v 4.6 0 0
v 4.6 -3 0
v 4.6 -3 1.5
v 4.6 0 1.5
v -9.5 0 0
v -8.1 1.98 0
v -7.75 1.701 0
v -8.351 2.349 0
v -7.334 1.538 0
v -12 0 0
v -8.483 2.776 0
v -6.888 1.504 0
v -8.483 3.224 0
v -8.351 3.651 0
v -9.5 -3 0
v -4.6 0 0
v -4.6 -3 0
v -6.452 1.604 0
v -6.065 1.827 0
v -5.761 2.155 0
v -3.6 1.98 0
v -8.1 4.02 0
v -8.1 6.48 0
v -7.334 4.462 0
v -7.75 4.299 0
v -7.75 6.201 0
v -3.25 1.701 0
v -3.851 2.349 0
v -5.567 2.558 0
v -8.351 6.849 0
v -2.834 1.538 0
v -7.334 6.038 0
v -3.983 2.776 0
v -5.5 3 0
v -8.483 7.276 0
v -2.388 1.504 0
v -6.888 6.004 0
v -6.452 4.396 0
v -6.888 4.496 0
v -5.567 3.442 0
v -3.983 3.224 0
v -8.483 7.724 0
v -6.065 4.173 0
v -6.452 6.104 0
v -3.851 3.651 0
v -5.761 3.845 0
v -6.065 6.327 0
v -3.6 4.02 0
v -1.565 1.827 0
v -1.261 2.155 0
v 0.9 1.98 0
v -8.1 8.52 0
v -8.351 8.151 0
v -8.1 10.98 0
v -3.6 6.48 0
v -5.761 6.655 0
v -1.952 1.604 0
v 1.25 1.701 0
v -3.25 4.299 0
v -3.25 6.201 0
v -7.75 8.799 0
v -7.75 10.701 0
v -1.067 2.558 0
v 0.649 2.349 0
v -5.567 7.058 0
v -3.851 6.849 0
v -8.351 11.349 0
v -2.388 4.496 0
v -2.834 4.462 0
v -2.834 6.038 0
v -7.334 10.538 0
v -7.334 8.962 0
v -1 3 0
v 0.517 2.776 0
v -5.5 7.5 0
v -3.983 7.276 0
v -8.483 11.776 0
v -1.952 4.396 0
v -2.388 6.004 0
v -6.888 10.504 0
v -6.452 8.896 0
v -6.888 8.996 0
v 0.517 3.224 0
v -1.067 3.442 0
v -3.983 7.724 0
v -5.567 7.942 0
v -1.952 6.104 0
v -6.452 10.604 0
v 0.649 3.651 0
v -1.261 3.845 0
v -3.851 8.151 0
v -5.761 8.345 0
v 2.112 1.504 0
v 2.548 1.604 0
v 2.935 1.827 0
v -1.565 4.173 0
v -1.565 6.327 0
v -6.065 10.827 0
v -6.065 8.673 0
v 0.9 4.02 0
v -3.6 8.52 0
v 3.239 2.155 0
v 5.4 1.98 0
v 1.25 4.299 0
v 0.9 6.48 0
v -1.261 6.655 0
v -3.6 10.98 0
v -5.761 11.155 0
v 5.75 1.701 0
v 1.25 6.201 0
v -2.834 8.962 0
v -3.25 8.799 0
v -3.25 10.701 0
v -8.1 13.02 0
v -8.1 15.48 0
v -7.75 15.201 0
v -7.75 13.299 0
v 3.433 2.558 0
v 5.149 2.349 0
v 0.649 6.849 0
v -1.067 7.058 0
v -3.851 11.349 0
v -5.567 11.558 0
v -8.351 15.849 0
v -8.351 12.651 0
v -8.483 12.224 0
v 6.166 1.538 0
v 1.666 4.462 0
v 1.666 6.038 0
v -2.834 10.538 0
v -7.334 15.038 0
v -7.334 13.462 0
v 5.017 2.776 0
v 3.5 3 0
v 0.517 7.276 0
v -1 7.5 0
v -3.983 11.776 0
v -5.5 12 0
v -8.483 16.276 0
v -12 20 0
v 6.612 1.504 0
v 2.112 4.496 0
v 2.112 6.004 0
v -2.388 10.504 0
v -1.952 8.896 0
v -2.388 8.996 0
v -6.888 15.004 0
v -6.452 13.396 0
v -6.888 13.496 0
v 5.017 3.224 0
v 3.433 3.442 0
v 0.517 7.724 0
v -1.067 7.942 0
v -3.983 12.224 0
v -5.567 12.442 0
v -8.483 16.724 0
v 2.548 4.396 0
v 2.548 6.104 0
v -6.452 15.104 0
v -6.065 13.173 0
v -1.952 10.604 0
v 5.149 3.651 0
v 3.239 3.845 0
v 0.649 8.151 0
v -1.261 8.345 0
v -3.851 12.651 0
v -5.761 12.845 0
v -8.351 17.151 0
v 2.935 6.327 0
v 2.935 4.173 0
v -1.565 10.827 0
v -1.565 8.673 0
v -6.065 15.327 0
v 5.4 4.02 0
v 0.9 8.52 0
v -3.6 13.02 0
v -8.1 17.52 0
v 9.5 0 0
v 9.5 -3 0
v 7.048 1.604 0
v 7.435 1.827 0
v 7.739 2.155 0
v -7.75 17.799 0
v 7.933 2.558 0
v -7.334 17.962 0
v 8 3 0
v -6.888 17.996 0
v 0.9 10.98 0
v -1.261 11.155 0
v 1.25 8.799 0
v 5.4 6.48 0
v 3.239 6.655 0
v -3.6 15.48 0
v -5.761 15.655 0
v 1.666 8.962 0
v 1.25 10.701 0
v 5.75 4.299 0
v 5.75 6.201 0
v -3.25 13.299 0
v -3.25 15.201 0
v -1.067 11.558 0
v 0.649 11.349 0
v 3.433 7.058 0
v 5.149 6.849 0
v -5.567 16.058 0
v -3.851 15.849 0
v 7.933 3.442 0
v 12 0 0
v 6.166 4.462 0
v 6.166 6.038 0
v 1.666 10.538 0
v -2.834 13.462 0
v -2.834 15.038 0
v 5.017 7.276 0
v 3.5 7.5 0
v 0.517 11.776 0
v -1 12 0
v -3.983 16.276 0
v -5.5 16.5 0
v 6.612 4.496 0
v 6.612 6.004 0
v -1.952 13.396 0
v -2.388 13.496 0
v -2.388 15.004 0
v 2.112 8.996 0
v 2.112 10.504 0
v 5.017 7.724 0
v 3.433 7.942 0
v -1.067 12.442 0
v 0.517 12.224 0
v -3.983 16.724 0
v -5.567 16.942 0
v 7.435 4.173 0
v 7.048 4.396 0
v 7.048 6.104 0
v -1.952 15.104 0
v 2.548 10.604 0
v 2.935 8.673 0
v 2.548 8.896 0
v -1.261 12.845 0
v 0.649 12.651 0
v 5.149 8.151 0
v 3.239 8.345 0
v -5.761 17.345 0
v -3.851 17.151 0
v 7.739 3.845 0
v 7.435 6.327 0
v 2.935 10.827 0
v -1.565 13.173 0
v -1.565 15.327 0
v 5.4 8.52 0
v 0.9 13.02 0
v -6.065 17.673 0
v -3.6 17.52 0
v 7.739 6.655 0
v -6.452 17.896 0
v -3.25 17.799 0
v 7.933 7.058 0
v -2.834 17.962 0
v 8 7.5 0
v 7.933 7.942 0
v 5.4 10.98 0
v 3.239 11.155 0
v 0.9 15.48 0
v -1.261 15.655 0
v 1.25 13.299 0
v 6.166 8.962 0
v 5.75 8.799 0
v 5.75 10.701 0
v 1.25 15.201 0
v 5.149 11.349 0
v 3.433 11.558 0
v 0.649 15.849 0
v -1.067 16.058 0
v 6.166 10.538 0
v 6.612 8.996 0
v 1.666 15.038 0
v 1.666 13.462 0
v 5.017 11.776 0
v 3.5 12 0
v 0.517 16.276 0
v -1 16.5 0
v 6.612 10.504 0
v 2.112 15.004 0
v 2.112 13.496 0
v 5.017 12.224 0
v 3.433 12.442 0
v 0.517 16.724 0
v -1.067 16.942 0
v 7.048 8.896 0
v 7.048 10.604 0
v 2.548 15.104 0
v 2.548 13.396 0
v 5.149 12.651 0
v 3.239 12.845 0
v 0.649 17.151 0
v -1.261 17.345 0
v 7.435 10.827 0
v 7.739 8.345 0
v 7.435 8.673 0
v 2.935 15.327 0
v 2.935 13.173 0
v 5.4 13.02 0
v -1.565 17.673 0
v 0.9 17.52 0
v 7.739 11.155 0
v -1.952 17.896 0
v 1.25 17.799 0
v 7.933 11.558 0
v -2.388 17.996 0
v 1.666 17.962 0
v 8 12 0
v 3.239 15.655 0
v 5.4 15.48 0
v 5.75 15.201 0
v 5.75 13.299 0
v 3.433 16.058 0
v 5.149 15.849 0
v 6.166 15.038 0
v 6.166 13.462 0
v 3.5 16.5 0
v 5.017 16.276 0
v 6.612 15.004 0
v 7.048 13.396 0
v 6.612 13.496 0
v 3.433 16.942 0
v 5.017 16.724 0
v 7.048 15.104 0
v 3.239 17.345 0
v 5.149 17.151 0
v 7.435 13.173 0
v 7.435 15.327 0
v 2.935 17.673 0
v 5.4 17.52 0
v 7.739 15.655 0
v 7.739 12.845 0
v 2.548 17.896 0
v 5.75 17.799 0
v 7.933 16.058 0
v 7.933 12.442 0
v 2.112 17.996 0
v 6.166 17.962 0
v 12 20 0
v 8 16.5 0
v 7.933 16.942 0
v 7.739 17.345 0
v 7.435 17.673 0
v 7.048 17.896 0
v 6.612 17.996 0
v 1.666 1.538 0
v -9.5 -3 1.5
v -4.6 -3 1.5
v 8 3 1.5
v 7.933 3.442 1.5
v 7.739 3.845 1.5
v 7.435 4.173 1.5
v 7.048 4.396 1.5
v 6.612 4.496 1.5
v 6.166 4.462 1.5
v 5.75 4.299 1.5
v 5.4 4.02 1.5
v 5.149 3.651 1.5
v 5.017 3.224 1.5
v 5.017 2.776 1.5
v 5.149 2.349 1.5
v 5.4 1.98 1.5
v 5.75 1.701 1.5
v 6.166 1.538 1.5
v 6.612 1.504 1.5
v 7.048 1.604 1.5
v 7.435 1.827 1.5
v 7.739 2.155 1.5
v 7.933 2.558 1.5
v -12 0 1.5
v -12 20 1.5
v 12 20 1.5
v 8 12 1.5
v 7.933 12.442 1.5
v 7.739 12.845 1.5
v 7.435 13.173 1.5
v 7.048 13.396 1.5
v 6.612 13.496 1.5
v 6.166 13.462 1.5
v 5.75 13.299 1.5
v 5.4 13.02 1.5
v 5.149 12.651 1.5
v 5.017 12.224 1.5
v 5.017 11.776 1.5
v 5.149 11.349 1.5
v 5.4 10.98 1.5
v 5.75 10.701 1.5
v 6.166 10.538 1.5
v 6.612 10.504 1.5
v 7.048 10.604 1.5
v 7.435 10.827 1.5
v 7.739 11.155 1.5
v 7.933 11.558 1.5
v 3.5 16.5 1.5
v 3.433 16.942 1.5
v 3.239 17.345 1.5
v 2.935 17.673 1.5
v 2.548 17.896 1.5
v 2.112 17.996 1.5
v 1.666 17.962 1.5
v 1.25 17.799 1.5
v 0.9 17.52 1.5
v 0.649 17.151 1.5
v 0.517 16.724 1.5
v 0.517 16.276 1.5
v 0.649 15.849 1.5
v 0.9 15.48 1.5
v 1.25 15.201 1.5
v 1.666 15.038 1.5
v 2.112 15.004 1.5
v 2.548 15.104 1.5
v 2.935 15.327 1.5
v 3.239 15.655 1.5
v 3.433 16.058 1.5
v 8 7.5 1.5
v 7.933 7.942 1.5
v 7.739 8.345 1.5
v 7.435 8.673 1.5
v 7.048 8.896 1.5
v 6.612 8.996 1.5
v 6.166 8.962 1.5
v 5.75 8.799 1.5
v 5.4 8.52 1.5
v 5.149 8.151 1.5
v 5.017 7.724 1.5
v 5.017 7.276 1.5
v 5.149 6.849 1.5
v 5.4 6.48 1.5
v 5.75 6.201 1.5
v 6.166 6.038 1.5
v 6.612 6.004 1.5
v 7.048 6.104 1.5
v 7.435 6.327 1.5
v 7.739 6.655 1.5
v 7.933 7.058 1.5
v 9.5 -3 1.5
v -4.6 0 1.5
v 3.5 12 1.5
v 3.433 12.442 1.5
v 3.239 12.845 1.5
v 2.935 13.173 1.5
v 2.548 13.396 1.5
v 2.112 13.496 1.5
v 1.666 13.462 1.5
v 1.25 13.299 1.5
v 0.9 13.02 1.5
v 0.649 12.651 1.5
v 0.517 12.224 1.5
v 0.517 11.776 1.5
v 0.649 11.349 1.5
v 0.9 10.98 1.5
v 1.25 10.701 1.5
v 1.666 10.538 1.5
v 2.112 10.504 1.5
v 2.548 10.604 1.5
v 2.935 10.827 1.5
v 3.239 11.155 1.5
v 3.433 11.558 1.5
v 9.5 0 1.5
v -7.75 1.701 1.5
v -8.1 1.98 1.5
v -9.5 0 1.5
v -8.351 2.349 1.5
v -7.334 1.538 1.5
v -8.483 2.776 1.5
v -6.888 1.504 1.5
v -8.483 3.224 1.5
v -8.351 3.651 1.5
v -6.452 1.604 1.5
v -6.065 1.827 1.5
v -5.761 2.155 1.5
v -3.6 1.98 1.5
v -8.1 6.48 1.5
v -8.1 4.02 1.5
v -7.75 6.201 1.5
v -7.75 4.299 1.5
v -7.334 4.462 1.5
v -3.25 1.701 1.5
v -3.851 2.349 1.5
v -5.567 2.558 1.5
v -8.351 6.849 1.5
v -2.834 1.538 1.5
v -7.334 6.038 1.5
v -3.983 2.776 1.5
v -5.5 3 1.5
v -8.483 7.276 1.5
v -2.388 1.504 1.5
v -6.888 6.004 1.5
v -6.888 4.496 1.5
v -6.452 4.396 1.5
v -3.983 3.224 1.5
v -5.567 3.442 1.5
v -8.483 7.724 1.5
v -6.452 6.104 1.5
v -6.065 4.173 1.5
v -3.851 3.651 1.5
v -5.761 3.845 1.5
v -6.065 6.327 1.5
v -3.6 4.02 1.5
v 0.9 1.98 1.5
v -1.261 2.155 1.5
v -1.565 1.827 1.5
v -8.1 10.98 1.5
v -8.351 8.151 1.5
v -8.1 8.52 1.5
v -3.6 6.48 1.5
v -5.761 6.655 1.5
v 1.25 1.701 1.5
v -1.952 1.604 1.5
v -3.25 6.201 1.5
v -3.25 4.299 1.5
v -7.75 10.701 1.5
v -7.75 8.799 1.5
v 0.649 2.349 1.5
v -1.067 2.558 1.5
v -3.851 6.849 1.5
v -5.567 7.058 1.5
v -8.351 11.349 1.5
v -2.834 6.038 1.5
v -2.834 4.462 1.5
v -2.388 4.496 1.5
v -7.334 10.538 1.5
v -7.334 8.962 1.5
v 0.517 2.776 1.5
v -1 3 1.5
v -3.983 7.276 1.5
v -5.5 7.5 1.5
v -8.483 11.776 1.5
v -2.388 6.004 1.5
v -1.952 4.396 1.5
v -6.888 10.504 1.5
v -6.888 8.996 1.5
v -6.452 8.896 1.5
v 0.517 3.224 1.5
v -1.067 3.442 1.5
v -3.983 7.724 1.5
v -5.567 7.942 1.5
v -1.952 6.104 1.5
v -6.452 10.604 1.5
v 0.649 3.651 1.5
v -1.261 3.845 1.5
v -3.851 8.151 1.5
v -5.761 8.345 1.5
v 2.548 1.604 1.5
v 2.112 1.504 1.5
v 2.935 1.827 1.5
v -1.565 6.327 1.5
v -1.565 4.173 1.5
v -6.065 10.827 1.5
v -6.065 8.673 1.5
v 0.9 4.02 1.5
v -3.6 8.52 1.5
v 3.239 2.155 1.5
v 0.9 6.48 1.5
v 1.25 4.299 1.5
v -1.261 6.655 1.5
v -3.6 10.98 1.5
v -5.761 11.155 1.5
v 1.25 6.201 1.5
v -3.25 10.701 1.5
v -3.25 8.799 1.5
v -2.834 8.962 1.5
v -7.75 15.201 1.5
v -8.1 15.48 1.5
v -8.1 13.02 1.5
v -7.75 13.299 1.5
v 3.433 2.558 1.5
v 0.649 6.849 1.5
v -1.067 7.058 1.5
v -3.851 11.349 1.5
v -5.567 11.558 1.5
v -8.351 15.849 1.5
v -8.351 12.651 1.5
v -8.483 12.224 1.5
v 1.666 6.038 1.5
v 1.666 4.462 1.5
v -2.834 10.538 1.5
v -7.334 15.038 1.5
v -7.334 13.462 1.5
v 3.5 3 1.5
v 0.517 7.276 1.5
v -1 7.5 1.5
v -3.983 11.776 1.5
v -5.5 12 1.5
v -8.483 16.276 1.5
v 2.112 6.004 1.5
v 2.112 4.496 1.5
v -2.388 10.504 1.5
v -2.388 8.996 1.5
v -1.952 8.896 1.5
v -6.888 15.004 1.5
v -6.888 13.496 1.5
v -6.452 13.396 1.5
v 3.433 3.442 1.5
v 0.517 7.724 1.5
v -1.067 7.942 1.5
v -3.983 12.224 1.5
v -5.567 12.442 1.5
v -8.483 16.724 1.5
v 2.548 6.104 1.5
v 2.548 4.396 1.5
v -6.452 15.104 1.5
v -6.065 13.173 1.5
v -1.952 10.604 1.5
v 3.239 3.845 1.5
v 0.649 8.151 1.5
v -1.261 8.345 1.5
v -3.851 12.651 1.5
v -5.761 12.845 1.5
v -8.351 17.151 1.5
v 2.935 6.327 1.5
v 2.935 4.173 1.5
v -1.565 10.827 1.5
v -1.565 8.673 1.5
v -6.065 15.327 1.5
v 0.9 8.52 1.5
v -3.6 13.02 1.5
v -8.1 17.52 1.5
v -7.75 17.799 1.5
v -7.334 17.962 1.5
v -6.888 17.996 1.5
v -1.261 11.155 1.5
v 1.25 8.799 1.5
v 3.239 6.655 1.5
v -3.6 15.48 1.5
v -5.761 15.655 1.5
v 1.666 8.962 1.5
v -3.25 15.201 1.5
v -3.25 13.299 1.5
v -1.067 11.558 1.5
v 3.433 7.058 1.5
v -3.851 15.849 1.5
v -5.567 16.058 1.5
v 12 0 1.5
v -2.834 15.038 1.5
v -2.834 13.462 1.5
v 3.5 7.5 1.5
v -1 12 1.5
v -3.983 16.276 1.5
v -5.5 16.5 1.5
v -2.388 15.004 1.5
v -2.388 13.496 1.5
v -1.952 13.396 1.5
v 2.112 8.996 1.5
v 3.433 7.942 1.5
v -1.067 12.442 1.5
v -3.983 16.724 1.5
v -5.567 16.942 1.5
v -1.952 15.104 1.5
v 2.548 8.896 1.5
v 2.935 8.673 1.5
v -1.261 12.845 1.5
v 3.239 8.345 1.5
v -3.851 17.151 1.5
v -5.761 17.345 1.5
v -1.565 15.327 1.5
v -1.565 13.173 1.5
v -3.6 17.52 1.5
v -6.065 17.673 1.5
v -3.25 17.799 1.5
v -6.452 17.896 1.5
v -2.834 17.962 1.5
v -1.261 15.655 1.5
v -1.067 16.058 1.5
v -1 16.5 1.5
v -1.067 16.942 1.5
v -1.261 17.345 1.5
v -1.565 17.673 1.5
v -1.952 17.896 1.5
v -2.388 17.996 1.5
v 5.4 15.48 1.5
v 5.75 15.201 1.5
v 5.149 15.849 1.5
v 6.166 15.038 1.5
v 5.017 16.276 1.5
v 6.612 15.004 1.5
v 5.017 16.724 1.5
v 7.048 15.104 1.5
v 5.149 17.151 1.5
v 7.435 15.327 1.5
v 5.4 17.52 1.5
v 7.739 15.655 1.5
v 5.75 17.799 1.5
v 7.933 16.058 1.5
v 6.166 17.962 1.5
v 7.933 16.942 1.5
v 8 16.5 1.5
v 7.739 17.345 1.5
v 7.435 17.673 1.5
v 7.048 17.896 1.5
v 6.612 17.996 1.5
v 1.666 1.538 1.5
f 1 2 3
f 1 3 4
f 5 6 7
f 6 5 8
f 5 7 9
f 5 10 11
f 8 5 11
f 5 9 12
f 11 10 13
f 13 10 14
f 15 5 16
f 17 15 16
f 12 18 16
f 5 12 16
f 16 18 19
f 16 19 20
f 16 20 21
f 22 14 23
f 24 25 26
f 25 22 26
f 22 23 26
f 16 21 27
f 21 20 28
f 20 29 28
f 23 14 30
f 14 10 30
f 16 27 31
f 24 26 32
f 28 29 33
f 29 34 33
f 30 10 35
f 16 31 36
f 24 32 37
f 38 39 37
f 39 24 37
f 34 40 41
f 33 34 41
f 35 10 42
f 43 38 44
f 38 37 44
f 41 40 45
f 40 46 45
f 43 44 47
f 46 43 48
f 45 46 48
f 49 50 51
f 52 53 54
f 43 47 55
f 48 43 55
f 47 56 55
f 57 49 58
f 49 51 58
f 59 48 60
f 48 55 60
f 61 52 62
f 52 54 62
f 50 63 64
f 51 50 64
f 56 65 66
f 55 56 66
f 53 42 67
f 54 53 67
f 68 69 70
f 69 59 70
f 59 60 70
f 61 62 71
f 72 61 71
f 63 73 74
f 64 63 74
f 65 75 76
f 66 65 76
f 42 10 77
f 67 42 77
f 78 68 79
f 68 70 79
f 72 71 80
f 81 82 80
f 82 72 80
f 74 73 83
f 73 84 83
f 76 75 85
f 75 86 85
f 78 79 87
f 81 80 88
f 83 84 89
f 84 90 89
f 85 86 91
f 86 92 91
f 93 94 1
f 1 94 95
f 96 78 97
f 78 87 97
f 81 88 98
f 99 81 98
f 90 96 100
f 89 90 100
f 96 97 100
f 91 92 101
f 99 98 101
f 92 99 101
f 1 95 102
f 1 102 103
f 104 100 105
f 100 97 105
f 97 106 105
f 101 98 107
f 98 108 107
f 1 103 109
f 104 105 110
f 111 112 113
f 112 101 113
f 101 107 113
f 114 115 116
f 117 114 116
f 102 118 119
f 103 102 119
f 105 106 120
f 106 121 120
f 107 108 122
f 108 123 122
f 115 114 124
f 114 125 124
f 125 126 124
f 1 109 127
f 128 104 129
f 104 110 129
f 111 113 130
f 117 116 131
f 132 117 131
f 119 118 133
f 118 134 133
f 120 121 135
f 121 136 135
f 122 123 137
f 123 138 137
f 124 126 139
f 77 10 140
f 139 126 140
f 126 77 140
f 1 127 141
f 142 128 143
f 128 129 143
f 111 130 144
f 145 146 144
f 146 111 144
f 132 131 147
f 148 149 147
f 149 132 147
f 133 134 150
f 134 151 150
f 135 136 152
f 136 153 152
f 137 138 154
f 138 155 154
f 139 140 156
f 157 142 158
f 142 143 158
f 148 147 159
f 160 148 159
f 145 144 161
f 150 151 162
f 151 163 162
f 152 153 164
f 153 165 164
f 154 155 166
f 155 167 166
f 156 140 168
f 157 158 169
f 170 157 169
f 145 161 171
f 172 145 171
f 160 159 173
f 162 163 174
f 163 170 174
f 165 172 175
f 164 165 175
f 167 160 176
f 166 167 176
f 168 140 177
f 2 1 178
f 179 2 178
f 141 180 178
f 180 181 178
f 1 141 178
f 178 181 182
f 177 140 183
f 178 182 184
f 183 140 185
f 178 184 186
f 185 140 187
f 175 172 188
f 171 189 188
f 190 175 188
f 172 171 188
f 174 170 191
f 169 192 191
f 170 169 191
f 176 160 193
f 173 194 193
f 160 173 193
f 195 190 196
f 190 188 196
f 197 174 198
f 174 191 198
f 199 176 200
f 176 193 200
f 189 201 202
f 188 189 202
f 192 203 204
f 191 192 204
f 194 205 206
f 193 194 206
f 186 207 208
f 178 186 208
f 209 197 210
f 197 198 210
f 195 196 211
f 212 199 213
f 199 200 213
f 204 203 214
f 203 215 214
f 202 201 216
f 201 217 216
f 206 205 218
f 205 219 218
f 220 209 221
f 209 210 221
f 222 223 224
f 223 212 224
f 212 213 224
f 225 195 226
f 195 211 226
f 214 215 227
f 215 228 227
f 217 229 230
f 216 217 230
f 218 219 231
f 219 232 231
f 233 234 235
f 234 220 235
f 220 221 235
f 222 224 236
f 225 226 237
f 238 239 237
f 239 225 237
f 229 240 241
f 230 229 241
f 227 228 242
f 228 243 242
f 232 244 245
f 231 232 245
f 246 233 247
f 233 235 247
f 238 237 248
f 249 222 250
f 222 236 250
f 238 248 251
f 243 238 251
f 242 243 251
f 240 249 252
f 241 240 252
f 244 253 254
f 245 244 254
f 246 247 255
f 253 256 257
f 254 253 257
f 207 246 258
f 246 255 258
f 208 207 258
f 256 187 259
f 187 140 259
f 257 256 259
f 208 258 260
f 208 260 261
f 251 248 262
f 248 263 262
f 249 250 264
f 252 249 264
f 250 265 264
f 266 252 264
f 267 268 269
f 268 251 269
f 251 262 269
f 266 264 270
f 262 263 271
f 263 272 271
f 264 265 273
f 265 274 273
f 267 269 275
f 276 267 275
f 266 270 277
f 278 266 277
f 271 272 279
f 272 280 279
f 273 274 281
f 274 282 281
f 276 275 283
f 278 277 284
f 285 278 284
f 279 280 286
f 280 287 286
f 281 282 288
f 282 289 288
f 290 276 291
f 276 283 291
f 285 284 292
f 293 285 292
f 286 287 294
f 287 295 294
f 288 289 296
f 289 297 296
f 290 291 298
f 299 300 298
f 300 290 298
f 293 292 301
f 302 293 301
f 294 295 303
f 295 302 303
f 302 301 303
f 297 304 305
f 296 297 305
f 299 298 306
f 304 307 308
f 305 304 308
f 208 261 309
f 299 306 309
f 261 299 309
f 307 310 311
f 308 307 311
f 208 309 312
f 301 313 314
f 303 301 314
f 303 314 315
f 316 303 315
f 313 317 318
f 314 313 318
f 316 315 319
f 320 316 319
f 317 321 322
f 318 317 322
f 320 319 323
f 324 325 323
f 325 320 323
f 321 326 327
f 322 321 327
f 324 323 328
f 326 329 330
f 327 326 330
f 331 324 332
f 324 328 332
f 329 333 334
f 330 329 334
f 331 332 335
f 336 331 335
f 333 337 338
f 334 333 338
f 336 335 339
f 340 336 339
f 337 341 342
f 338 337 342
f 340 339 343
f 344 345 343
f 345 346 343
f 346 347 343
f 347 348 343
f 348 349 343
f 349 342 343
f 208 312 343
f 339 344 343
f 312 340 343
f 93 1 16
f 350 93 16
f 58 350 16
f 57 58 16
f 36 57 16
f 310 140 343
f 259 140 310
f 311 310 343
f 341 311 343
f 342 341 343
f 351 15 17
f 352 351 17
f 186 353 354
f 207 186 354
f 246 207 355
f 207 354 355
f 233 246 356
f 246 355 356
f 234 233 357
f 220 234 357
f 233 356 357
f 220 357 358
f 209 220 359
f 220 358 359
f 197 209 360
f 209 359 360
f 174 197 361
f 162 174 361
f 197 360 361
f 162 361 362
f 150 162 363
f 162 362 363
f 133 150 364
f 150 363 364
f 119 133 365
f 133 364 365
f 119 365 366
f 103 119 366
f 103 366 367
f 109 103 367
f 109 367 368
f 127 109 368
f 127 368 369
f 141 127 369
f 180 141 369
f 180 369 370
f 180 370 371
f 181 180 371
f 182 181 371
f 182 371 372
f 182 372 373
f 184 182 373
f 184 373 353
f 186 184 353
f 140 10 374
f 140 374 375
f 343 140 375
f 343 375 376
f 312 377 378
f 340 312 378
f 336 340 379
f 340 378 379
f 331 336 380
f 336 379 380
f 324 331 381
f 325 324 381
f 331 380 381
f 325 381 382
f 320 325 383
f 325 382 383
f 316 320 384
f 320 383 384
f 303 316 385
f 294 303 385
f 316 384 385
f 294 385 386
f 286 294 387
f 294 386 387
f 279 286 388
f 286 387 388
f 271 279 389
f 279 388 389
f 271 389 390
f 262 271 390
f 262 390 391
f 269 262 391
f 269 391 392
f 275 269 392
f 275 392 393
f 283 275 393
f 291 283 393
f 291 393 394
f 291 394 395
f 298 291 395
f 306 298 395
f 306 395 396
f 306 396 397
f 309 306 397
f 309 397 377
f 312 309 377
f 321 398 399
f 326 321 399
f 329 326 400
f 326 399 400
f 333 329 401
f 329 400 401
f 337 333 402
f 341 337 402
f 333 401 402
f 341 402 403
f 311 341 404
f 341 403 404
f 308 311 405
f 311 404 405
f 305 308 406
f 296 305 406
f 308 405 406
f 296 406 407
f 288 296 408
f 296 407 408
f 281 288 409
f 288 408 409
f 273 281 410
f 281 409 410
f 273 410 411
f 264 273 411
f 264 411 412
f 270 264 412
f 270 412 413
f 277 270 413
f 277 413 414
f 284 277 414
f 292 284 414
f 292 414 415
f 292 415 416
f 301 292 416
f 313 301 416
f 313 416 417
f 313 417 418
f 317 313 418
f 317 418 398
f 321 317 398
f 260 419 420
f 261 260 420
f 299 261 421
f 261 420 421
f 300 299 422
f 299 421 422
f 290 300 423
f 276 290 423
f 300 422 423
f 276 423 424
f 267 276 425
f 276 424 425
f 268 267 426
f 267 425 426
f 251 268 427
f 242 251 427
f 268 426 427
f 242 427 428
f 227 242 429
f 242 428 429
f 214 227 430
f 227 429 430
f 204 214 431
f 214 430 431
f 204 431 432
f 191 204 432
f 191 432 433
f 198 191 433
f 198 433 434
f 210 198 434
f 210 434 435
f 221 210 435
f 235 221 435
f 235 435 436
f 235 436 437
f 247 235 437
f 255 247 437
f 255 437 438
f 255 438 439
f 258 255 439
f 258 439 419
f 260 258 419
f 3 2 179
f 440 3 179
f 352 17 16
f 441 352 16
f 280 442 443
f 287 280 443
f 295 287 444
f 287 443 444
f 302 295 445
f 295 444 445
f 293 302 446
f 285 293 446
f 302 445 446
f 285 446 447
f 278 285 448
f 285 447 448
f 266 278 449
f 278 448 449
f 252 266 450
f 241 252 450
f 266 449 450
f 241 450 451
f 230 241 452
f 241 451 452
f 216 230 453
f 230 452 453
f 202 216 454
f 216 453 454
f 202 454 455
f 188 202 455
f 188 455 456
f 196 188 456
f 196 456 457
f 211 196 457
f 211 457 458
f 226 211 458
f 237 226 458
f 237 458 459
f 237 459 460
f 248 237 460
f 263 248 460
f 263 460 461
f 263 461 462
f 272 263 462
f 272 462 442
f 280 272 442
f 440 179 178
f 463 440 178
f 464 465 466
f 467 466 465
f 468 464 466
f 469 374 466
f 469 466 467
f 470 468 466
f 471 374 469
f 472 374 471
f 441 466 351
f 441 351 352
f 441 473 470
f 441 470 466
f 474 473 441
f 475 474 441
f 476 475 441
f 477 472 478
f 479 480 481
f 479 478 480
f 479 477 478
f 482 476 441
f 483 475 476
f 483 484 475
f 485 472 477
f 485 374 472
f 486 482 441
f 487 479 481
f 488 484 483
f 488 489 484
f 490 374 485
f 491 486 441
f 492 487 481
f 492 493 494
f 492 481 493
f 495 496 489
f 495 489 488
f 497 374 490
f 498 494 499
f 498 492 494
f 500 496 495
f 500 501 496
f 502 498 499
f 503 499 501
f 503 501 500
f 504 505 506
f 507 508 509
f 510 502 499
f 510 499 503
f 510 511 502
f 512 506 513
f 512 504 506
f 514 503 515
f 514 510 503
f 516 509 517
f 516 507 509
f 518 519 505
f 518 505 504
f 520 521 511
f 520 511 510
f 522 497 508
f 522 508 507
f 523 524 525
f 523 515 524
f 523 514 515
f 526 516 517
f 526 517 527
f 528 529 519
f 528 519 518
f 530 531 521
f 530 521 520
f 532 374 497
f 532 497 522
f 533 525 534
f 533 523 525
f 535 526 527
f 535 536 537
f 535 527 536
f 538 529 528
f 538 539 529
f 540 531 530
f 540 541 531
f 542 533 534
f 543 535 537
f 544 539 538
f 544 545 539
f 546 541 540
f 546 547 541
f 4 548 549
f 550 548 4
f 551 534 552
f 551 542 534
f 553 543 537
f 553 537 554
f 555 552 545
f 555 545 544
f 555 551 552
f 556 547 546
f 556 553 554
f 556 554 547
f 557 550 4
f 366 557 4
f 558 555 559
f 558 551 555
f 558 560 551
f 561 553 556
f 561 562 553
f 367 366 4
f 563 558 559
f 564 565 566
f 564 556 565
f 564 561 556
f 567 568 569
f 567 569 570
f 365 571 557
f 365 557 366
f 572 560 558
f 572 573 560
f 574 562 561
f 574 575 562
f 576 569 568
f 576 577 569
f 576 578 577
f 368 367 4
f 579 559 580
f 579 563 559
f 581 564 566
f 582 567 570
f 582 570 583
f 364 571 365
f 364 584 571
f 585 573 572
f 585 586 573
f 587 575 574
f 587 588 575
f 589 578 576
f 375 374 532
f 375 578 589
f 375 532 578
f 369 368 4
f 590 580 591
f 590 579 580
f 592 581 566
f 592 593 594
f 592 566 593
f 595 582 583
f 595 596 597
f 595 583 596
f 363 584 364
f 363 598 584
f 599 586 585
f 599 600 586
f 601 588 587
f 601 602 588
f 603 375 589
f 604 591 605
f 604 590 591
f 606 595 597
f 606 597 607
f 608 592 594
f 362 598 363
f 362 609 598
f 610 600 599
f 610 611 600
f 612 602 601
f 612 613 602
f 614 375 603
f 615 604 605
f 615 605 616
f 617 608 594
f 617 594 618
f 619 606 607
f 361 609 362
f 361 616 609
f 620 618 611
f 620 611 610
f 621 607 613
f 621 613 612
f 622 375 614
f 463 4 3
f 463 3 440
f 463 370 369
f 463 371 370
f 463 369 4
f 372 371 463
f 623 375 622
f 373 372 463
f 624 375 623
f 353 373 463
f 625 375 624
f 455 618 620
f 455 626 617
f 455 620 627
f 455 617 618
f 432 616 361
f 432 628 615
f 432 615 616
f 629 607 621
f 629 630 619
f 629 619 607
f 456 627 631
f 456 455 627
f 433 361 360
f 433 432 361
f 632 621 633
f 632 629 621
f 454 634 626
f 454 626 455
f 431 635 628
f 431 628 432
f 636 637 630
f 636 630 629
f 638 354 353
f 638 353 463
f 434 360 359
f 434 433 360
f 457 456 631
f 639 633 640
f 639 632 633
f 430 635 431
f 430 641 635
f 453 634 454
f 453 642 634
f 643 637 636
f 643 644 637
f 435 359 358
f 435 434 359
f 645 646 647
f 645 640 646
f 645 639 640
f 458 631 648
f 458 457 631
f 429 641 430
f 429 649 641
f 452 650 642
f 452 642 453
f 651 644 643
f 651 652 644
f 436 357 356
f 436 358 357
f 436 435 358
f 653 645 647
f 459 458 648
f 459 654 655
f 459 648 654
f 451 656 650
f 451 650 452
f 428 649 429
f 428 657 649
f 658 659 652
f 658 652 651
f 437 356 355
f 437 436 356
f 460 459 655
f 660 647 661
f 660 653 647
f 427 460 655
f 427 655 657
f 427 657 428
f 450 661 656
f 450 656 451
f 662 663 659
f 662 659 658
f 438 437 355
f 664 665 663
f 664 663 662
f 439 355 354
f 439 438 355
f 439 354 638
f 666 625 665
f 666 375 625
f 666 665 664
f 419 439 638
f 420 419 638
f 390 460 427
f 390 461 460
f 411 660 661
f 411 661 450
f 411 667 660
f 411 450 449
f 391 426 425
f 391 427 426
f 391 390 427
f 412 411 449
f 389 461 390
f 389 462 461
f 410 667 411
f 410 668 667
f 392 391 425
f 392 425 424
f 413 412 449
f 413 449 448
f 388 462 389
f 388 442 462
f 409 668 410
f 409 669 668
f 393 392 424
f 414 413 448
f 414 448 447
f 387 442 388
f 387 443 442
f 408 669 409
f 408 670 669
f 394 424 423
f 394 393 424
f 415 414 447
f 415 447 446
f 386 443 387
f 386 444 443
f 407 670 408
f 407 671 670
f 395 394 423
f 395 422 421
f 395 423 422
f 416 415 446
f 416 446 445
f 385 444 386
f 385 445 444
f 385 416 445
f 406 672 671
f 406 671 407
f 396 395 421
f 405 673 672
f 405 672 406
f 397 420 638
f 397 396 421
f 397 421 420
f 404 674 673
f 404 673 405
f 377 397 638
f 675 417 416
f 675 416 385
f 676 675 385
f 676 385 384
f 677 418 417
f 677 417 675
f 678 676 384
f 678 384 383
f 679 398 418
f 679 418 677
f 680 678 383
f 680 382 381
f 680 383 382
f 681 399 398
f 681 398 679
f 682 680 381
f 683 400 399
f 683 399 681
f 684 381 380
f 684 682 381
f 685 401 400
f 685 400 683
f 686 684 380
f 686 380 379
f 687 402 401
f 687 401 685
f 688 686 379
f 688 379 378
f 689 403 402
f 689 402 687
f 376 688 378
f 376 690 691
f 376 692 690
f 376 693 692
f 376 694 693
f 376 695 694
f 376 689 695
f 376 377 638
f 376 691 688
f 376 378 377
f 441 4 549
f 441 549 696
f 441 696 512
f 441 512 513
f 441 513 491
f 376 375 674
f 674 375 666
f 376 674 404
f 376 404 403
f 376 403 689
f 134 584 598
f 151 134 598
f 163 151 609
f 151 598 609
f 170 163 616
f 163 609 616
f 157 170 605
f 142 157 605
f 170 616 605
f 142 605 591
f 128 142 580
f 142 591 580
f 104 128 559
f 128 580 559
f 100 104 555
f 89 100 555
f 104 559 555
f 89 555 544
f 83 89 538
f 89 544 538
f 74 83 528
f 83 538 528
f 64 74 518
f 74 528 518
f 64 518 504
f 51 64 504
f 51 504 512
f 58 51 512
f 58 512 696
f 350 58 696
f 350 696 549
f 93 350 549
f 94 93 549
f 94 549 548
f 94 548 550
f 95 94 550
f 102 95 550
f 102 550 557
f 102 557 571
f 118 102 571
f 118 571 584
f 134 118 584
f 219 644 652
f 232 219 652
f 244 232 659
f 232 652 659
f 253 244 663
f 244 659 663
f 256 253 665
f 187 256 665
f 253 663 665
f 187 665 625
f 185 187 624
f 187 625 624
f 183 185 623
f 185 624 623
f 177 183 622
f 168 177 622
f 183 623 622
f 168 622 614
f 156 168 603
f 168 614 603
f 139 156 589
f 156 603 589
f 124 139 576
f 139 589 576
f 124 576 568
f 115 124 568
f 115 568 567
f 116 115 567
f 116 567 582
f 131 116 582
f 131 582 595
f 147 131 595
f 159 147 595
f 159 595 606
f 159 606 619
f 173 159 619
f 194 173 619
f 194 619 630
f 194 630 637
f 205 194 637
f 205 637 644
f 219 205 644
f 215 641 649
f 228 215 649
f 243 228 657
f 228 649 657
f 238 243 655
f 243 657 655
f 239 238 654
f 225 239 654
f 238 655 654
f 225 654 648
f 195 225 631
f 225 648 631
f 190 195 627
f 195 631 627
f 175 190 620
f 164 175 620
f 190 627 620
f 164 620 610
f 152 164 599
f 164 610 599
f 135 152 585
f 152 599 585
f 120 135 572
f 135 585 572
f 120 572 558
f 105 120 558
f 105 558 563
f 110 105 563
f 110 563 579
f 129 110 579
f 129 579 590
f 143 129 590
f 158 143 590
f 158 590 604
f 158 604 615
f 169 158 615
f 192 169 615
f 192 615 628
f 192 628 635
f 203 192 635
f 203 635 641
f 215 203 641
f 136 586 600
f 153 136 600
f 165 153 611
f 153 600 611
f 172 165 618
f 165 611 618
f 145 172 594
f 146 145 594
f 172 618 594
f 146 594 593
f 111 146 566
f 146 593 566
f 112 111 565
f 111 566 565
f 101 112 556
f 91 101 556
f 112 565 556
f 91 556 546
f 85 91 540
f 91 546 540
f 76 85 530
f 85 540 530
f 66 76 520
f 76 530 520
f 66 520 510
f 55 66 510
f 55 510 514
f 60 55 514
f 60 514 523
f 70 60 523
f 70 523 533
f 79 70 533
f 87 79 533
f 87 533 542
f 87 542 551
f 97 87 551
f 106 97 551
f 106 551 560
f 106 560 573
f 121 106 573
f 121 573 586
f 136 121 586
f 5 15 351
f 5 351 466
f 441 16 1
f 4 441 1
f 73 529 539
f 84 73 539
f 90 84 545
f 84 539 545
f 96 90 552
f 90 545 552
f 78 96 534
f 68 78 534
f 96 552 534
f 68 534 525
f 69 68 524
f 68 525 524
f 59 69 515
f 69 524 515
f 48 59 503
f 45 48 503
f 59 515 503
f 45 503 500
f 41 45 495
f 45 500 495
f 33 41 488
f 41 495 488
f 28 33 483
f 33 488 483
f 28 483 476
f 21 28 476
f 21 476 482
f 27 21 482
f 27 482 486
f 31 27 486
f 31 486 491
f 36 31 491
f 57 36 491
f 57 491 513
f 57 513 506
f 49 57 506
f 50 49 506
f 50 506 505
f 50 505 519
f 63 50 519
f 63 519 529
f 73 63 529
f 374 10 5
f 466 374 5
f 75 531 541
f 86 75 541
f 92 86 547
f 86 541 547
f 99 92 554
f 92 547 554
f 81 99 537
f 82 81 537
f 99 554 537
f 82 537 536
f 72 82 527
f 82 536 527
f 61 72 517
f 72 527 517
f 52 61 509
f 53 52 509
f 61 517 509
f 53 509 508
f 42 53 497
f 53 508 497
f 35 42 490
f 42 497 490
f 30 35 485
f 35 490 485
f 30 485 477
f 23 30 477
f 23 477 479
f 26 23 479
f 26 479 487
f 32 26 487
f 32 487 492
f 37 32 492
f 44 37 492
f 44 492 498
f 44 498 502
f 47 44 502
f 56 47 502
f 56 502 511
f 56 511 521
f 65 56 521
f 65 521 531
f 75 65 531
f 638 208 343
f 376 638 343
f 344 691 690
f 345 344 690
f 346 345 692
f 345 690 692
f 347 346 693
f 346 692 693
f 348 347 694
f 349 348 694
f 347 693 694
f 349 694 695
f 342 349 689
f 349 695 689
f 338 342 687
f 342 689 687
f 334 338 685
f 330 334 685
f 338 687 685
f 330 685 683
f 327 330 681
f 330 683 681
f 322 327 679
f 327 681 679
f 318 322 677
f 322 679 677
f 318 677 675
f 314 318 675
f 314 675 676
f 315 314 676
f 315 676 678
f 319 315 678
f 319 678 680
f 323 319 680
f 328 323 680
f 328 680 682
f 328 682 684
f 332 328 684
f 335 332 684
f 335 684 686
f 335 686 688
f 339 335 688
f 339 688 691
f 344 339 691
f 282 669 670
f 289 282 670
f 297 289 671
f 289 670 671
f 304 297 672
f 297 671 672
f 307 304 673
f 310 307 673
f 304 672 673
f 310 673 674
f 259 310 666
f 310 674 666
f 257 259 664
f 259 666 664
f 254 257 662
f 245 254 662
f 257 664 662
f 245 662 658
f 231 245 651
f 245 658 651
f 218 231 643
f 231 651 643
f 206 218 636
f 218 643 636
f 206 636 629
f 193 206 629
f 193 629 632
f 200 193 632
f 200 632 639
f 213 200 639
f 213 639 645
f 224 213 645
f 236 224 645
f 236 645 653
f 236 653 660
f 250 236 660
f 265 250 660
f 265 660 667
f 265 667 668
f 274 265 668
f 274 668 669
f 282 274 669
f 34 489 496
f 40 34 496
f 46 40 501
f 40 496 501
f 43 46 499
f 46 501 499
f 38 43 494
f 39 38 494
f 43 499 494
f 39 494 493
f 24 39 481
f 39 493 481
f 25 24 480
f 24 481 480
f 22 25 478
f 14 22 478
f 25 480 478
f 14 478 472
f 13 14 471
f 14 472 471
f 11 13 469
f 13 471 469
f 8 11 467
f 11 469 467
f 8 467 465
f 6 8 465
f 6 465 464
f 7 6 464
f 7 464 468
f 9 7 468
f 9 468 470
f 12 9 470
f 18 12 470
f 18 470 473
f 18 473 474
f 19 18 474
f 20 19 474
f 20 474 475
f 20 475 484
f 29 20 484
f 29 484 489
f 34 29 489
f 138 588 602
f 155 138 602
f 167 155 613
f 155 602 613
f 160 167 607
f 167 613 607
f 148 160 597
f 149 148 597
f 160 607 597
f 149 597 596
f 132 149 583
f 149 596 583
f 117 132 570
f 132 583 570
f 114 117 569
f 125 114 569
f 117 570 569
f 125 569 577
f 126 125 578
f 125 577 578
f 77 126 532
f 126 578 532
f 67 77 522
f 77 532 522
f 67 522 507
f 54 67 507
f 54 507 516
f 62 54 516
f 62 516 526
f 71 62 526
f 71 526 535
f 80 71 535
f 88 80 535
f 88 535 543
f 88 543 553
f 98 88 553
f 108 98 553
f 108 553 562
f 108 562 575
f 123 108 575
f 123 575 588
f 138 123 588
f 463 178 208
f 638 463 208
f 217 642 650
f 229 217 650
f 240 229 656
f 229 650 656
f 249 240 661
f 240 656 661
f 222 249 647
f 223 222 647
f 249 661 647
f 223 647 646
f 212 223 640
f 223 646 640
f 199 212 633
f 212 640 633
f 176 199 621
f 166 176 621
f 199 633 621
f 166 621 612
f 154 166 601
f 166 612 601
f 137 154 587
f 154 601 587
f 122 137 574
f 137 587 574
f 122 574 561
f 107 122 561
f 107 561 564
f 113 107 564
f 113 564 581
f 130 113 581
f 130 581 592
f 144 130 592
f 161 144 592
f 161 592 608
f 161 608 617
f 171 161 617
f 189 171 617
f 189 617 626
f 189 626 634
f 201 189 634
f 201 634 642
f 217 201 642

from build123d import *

# Parameters (mm, degrees)
ESQUISSE1_W             = 24
ESQUISSE1_H             = 20
BOSS_EXTRU_1_DEPTH      = 1.5
ESQUISSE2_W             = 4.9
ESQUISSE2_H             = 3
BOSS_EXTRU_2_DEPTH      = 1.5
ENL_V_MAT_EXTRU_1_REACH = 25.372
ESQUISSE3_R             = 1.5


with BuildPart() as part:
    # Esquisse1 → Boss.-Extru.1 (new body)
    with BuildSketch(Plane.XY):
        with Locations((0, 10)):
            Rectangle(ESQUISSE1_W, ESQUISSE1_H)
    extrude(amount=BOSS_EXTRU_1_DEPTH)

    # Esquisse2 → Boss.-Extru.2 (add)
    with BuildSketch(Plane.XY):
        with Locations((7.05, -1.5)):
            Rectangle(ESQUISSE2_W, ESQUISSE2_H)
        with Locations((-7.05, -1.5)):
            Rectangle(ESQUISSE2_W, ESQUISSE2_H)
    extrude(amount=BOSS_EXTRU_2_DEPTH)

    # Esquisse3 → Enlèv. mat.-Extru.1 (cut, up to next)
    with BuildSketch(Plane.XY.offset(1.5), mode=Mode.PRIVATE) as enl_v_mat_extru_1_sk1:
        with Locations((-7, 3)):
            Circle(ESQUISSE3_R)
    enl_v_mat_extru_1_tool1 = extrude(enl_v_mat_extru_1_sk1.sketch, amount=-ENL_V_MAT_EXTRU_1_REACH, mode=Mode.PRIVATE) & part.part
    # Esquisse3 → Enlèv. mat.-Extru.1 (cut, up to next)
    with BuildSketch(Plane.XY.offset(1.5), mode=Mode.PRIVATE) as enl_v_mat_extru_1_sk2:
        with Locations((-2.5, 3)):
            Circle(ESQUISSE3_R)
    enl_v_mat_extru_1_tool2 = extrude(enl_v_mat_extru_1_sk2.sketch, amount=-ENL_V_MAT_EXTRU_1_REACH, mode=Mode.PRIVATE) & part.part
    # Esquisse3 → Enlèv. mat.-Extru.1 (cut, up to next)
    with BuildSketch(Plane.XY.offset(1.5), mode=Mode.PRIVATE) as enl_v_mat_extru_1_sk3:
        with Locations((2, 3)):
            Circle(ESQUISSE3_R)
    enl_v_mat_extru_1_tool3 = extrude(enl_v_mat_extru_1_sk3.sketch, amount=-ENL_V_MAT_EXTRU_1_REACH, mode=Mode.PRIVATE) & part.part
    # Esquisse3 → Enlèv. mat.-Extru.1 (cut, up to next)
    with BuildSketch(Plane.XY.offset(1.5), mode=Mode.PRIVATE) as enl_v_mat_extru_1_sk4:
        with Locations((6.5, 3)):
            Circle(ESQUISSE3_R)
    enl_v_mat_extru_1_tool4 = extrude(enl_v_mat_extru_1_sk4.sketch, amount=-ENL_V_MAT_EXTRU_1_REACH, mode=Mode.PRIVATE) & part.part
    # Esquisse3 → Enlèv. mat.-Extru.1 (cut, up to next)
    with BuildSketch(Plane.XY.offset(1.5), mode=Mode.PRIVATE) as enl_v_mat_extru_1_sk5:
        with Locations((-2.5, 7.5)):
            Circle(ESQUISSE3_R)
    enl_v_mat_extru_1_tool5 = extrude(enl_v_mat_extru_1_sk5.sketch, amount=-ENL_V_MAT_EXTRU_1_REACH, mode=Mode.PRIVATE) & part.part
    # Esquisse3 → Enlèv. mat.-Extru.1 (cut, up to next)
    with BuildSketch(Plane.XY.offset(1.5), mode=Mode.PRIVATE) as enl_v_mat_extru_1_sk6:
        with Locations((2, 7.5)):
            Circle(ESQUISSE3_R)
    enl_v_mat_extru_1_tool6 = extrude(enl_v_mat_extru_1_sk6.sketch, amount=-ENL_V_MAT_EXTRU_1_REACH, mode=Mode.PRIVATE) & part.part
    # Esquisse3 → Enlèv. mat.-Extru.1 (cut, up to next)
    with BuildSketch(Plane.XY.offset(1.5), mode=Mode.PRIVATE) as enl_v_mat_extru_1_sk7:
        with Locations((6.5, 7.5)):
            Circle(ESQUISSE3_R)
    enl_v_mat_extru_1_tool7 = extrude(enl_v_mat_extru_1_sk7.sketch, amount=-ENL_V_MAT_EXTRU_1_REACH, mode=Mode.PRIVATE) & part.part
    # Esquisse3 → Enlèv. mat.-Extru.1 (cut, up to next)
    with BuildSketch(Plane.XY.offset(1.5), mode=Mode.PRIVATE) as enl_v_mat_extru_1_sk8:
        with Locations((-2.5, 12)):
            Circle(ESQUISSE3_R)
    enl_v_mat_extru_1_tool8 = extrude(enl_v_mat_extru_1_sk8.sketch, amount=-ENL_V_MAT_EXTRU_1_REACH, mode=Mode.PRIVATE) & part.part
    # Esquisse3 → Enlèv. mat.-Extru.1 (cut, up to next)
    with BuildSketch(Plane.XY.offset(1.5), mode=Mode.PRIVATE) as enl_v_mat_extru_1_sk9:
        with Locations((2, 12)):
            Circle(ESQUISSE3_R)
    enl_v_mat_extru_1_tool9 = extrude(enl_v_mat_extru_1_sk9.sketch, amount=-ENL_V_MAT_EXTRU_1_REACH, mode=Mode.PRIVATE) & part.part
    # Esquisse3 → Enlèv. mat.-Extru.1 (cut, up to next)
    with BuildSketch(Plane.XY.offset(1.5), mode=Mode.PRIVATE) as enl_v_mat_extru_1_sk10:
        with Locations((6.5, 12)):
            Circle(ESQUISSE3_R)
    enl_v_mat_extru_1_tool10 = extrude(enl_v_mat_extru_1_sk10.sketch, amount=-ENL_V_MAT_EXTRU_1_REACH, mode=Mode.PRIVATE) & part.part
    # Esquisse3 → Enlèv. mat.-Extru.1 (cut, up to next)
    with BuildSketch(Plane.XY.offset(1.5), mode=Mode.PRIVATE) as enl_v_mat_extru_1_sk11:
        with Locations((-2.5, 16.5)):
            Circle(ESQUISSE3_R)
    enl_v_mat_extru_1_tool11 = extrude(enl_v_mat_extru_1_sk11.sketch, amount=-ENL_V_MAT_EXTRU_1_REACH, mode=Mode.PRIVATE) & part.part
    # Esquisse3 → Enlèv. mat.-Extru.1 (cut, up to next)
    with BuildSketch(Plane.XY.offset(1.5), mode=Mode.PRIVATE) as enl_v_mat_extru_1_sk12:
        with Locations((2, 16.5)):
            Circle(ESQUISSE3_R)
    enl_v_mat_extru_1_tool12 = extrude(enl_v_mat_extru_1_sk12.sketch, amount=-ENL_V_MAT_EXTRU_1_REACH, mode=Mode.PRIVATE) & part.part
    # Esquisse3 → Enlèv. mat.-Extru.1 (cut, up to next)
    with BuildSketch(Plane.XY.offset(1.5), mode=Mode.PRIVATE) as enl_v_mat_extru_1_sk13:
        with Locations((6.5, 16.5)):
            Circle(ESQUISSE3_R)
    enl_v_mat_extru_1_tool13 = extrude(enl_v_mat_extru_1_sk13.sketch, amount=-ENL_V_MAT_EXTRU_1_REACH, mode=Mode.PRIVATE) & part.part
    # Esquisse3 → Enlèv. mat.-Extru.1 (cut, up to next)
    with BuildSketch(Plane.XY.offset(1.5), mode=Mode.PRIVATE) as enl_v_mat_extru_1_sk14:
        with Locations((-7, 7.5)):
            Circle(ESQUISSE3_R)
    enl_v_mat_extru_1_tool14 = extrude(enl_v_mat_extru_1_sk14.sketch, amount=-ENL_V_MAT_EXTRU_1_REACH, mode=Mode.PRIVATE) & part.part
    # Esquisse3 → Enlèv. mat.-Extru.1 (cut, up to next)
    with BuildSketch(Plane.XY.offset(1.5), mode=Mode.PRIVATE) as enl_v_mat_extru_1_sk15:
        with Locations((-7, 12)):
            Circle(ESQUISSE3_R)
    enl_v_mat_extru_1_tool15 = extrude(enl_v_mat_extru_1_sk15.sketch, amount=-ENL_V_MAT_EXTRU_1_REACH, mode=Mode.PRIVATE) & part.part
    # Esquisse3 → Enlèv. mat.-Extru.1 (cut, up to next)
    with BuildSketch(Plane.XY.offset(1.5), mode=Mode.PRIVATE) as enl_v_mat_extru_1_sk16:
        with Locations((-7, 16.5)):
            Circle(ESQUISSE3_R)
    enl_v_mat_extru_1_tool16 = extrude(enl_v_mat_extru_1_sk16.sketch, amount=-ENL_V_MAT_EXTRU_1_REACH, mode=Mode.PRIVATE) & part.part
    add(enl_v_mat_extru_1_tool1.solids().sort_by_distance((-7, 3, 1.5))[0], mode=Mode.SUBTRACT)
    add(enl_v_mat_extru_1_tool2.solids().sort_by_distance((-2.5, 3, 1.5))[0], mode=Mode.SUBTRACT)
    add(enl_v_mat_extru_1_tool3.solids().sort_by_distance((2, 3, 1.5))[0], mode=Mode.SUBTRACT)
    add(enl_v_mat_extru_1_tool4.solids().sort_by_distance((6.5, 3, 1.5))[0], mode=Mode.SUBTRACT)
    add(enl_v_mat_extru_1_tool5.solids().sort_by_distance((-2.5, 7.5, 1.5))[0], mode=Mode.SUBTRACT)
    add(enl_v_mat_extru_1_tool6.solids().sort_by_distance((2, 7.5, 1.5))[0], mode=Mode.SUBTRACT)
    add(enl_v_mat_extru_1_tool7.solids().sort_by_distance((6.5, 7.5, 1.5))[0], mode=Mode.SUBTRACT)
    add(enl_v_mat_extru_1_tool8.solids().sort_by_distance((-2.5, 12, 1.5))[0], mode=Mode.SUBTRACT)
    add(enl_v_mat_extru_1_tool9.solids().sort_by_distance((2, 12, 1.5))[0], mode=Mode.SUBTRACT)
    add(enl_v_mat_extru_1_tool10.solids().sort_by_distance((6.5, 12, 1.5))[0], mode=Mode.SUBTRACT)
    add(enl_v_mat_extru_1_tool11.solids().sort_by_distance((-2.5, 16.5, 1.5))[0], mode=Mode.SUBTRACT)
    add(enl_v_mat_extru_1_tool12.solids().sort_by_distance((2, 16.5, 1.5))[0], mode=Mode.SUBTRACT)
    add(enl_v_mat_extru_1_tool13.solids().sort_by_distance((6.5, 16.5, 1.5))[0], mode=Mode.SUBTRACT)
    add(enl_v_mat_extru_1_tool14.solids().sort_by_distance((-7, 7.5, 1.5))[0], mode=Mode.SUBTRACT)
    add(enl_v_mat_extru_1_tool15.solids().sort_by_distance((-7, 12, 1.5))[0], mode=Mode.SUBTRACT)
    add(enl_v_mat_extru_1_tool16.solids().sort_by_distance((-7, 16.5, 1.5))[0], mode=Mode.SUBTRACT)


solid = part.part
